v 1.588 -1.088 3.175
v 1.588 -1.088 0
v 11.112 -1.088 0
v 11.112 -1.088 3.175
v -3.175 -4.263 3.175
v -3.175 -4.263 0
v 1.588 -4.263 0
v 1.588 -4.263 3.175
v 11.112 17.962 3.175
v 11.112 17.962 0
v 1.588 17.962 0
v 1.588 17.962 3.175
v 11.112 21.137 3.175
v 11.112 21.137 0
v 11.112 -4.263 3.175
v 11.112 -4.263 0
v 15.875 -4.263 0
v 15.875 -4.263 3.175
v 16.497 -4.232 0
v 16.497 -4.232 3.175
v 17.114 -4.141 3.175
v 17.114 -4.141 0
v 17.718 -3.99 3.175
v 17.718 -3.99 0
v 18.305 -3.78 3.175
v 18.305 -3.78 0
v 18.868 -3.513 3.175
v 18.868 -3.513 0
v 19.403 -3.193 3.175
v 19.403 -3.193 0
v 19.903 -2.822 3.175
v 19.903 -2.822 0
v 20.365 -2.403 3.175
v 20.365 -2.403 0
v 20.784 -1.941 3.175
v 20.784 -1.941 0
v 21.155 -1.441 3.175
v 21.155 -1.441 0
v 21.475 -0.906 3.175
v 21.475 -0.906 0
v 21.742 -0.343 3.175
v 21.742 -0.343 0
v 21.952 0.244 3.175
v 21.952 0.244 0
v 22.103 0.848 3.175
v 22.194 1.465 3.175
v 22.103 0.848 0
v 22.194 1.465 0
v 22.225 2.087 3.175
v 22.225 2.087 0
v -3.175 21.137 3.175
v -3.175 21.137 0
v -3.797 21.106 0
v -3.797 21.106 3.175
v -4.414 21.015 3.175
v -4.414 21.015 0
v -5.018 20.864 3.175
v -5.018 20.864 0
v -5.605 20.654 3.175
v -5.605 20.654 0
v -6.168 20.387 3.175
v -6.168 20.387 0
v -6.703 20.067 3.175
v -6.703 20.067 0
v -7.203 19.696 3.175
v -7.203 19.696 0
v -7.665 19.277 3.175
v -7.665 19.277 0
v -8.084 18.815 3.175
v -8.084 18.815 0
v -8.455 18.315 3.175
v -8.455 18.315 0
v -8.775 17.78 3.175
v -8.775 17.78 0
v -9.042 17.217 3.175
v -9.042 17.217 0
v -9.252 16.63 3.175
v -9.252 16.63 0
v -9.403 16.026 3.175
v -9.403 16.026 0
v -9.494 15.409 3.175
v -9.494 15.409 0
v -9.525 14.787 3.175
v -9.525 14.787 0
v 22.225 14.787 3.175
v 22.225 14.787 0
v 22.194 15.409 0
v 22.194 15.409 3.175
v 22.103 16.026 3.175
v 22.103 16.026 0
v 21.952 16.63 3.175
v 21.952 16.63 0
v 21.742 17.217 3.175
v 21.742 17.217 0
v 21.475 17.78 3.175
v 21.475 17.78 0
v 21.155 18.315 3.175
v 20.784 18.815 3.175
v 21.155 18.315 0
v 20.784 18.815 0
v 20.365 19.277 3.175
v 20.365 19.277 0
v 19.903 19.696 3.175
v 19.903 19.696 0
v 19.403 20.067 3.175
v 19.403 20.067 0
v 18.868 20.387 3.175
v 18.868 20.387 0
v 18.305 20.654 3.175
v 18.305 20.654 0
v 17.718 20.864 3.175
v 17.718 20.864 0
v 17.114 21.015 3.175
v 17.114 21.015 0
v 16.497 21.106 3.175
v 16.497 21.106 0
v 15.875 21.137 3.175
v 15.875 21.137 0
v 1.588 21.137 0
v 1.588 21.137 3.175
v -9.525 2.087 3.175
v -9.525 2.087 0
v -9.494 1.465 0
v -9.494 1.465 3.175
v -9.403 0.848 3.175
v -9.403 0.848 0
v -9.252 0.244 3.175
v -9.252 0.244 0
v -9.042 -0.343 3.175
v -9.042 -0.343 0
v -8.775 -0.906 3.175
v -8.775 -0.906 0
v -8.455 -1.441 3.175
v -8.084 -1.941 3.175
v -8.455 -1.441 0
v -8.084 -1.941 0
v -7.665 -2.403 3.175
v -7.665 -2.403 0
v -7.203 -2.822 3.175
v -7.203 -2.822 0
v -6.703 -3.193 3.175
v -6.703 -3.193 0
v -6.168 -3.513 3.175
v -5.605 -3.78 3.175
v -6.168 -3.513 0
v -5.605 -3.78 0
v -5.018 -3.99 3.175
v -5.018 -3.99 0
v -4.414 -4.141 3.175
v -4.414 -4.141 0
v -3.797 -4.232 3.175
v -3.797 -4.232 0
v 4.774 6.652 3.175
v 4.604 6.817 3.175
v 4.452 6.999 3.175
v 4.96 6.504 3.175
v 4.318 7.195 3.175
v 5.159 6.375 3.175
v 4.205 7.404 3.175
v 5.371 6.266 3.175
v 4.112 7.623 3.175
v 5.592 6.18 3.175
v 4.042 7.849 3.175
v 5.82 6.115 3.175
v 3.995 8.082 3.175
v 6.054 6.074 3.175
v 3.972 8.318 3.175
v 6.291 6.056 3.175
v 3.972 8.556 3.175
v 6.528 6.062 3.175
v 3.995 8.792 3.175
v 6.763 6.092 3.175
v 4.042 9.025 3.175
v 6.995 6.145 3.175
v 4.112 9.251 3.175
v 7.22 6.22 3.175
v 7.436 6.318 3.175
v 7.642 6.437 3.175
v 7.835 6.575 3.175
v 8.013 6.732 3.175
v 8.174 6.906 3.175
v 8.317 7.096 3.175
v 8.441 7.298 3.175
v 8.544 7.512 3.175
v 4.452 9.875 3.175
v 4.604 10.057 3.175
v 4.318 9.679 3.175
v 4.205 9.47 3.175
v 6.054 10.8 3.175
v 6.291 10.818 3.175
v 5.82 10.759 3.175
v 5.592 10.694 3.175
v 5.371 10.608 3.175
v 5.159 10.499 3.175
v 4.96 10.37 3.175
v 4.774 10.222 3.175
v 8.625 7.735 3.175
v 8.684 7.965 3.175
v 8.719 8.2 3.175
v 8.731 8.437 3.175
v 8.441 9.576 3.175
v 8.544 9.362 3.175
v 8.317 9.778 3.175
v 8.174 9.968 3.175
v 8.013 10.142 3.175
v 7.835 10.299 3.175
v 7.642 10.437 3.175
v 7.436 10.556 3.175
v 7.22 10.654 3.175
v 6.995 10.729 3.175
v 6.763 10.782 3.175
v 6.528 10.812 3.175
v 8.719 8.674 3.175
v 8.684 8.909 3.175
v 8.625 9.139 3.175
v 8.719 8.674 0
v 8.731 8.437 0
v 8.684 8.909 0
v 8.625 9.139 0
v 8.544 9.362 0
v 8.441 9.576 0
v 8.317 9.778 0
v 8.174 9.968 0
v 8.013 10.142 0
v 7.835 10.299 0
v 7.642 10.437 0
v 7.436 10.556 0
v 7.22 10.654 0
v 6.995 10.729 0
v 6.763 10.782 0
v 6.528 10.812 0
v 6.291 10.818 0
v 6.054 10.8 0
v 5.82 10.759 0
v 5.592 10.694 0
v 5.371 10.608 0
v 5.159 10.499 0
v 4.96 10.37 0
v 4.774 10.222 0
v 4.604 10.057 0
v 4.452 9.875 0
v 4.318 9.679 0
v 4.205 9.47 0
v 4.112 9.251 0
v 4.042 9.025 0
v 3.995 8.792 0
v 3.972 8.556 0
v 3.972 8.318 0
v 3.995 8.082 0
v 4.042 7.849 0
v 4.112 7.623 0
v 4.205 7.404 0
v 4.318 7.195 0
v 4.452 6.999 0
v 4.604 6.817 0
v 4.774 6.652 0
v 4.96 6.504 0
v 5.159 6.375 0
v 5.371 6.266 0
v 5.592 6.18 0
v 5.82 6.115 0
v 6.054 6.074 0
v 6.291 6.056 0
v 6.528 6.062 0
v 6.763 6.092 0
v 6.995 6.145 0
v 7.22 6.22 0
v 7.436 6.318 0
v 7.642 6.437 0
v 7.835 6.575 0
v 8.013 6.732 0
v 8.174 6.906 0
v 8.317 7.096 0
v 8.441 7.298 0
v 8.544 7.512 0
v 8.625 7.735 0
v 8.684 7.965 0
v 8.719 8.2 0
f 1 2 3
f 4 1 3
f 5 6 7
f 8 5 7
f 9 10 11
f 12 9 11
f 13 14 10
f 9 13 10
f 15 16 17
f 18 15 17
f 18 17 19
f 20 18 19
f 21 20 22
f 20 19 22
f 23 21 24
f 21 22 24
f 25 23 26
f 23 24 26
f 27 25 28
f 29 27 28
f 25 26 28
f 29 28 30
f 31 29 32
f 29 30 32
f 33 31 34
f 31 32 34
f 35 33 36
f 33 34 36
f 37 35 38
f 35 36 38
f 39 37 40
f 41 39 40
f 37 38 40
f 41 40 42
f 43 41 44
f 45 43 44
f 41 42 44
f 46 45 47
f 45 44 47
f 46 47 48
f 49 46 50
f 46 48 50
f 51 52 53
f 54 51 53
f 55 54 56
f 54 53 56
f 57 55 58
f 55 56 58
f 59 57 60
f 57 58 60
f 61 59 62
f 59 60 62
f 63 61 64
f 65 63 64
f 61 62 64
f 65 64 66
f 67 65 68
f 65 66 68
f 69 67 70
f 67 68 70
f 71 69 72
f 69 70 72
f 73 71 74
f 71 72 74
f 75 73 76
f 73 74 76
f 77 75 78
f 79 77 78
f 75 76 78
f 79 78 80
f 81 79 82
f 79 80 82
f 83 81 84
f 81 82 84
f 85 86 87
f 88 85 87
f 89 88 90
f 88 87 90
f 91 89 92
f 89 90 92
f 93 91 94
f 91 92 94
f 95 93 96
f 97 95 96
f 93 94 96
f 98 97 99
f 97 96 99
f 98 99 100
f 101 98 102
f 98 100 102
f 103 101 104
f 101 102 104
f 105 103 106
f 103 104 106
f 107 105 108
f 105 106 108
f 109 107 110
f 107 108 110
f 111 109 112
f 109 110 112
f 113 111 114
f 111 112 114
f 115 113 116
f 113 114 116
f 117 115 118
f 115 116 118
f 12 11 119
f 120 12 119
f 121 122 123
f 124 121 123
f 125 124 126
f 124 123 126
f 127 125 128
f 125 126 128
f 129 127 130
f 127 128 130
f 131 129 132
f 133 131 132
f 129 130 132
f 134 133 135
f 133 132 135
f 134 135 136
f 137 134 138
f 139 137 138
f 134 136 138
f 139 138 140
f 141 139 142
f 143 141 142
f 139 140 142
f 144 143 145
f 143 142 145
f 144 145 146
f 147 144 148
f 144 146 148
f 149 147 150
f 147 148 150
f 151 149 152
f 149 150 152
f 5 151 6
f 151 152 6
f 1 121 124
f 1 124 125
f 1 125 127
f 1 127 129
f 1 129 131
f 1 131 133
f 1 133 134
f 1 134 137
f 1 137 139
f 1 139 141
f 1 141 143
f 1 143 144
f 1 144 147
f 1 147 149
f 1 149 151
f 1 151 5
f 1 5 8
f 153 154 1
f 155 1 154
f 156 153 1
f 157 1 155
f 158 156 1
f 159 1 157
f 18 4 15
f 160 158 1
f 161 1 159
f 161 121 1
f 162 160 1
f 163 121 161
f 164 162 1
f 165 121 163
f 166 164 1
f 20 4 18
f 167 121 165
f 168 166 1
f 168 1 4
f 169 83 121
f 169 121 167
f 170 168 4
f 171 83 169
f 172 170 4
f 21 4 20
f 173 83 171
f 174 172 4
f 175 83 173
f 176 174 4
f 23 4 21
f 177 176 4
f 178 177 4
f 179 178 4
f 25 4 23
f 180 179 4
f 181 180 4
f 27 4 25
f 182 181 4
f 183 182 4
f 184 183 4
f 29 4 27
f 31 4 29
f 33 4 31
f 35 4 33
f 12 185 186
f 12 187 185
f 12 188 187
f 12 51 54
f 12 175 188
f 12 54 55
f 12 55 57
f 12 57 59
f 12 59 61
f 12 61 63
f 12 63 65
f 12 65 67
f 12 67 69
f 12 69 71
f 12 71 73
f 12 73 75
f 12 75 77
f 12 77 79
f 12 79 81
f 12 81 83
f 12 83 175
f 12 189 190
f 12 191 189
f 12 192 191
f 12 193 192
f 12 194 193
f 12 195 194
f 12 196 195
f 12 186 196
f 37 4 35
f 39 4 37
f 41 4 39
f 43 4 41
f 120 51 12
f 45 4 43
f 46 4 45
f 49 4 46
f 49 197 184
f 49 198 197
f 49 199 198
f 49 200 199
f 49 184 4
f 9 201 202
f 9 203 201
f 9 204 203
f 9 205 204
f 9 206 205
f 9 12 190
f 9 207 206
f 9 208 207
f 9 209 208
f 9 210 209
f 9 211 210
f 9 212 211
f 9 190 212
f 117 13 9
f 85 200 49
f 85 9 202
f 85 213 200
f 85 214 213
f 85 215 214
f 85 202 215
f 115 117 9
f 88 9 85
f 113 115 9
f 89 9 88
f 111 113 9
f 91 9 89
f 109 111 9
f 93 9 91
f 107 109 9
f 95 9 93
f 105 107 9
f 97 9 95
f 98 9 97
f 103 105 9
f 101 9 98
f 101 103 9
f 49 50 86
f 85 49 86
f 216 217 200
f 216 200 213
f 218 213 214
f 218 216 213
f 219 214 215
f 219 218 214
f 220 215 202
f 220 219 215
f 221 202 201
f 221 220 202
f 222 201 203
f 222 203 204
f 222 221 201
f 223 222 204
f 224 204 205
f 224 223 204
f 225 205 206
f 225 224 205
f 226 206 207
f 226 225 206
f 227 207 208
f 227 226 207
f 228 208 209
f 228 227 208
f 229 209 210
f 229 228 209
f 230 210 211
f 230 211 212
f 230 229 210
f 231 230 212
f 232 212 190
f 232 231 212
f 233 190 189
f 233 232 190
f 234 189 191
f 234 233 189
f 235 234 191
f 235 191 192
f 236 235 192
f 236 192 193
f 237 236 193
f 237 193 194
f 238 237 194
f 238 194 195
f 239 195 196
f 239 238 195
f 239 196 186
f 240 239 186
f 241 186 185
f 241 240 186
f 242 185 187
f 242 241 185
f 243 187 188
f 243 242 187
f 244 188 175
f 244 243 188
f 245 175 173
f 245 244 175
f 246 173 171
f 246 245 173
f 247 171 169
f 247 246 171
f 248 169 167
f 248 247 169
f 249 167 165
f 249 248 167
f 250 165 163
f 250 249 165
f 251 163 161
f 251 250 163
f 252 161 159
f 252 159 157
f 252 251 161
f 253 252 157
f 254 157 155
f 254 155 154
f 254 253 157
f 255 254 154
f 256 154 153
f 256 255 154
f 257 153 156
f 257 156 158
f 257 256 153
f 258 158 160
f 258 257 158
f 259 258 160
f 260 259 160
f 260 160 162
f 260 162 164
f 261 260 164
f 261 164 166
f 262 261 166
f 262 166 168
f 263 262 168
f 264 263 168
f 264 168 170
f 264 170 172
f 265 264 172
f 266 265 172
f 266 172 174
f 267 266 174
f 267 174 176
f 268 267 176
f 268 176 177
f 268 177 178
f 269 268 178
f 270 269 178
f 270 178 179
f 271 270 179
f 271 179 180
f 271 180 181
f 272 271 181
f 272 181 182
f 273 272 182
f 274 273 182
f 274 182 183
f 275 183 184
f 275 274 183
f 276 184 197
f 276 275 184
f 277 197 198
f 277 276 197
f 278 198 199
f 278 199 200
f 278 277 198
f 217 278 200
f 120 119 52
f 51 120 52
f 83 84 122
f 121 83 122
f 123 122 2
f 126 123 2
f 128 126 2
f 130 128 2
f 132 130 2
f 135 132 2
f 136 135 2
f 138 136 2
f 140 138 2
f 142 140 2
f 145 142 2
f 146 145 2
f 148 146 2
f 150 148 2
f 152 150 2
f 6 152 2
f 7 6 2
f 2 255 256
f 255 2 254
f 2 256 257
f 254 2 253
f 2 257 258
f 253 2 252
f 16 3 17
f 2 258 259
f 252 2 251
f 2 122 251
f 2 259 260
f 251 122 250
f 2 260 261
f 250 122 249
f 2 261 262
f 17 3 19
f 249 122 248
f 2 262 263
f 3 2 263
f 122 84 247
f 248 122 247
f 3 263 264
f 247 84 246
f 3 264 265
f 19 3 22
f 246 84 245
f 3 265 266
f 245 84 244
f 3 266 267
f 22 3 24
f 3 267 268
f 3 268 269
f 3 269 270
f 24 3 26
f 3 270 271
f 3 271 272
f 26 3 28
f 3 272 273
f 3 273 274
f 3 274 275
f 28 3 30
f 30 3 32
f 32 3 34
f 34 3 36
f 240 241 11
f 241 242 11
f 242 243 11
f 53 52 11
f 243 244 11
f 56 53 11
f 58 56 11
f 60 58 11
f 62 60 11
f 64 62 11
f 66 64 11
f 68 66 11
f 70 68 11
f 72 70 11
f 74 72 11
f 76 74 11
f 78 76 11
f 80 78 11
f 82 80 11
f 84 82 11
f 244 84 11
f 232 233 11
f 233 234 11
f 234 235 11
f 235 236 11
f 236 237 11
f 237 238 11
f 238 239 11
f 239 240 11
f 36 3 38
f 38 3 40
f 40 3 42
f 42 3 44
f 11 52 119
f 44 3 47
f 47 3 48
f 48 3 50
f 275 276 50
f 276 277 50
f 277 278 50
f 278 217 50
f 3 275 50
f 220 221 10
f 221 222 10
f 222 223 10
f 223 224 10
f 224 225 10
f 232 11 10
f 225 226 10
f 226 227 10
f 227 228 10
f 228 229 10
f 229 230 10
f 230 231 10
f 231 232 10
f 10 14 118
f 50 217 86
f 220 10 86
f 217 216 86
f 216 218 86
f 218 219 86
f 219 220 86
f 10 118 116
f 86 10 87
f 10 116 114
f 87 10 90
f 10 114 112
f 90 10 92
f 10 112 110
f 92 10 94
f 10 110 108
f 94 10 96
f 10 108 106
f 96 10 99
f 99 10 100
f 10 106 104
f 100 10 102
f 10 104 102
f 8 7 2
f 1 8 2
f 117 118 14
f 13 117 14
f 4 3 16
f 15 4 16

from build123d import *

# Parameters (mm, degrees)
SKETCH1_R           = 2.38125
BOSS_EXTRUDE1_DEPTH = 3.175


with BuildPart() as part:
    # Sketch1 → Boss-Extrude1 (new body)
    with BuildSketch(Plane.XY):
        with BuildLine():
            Line((1.5875, 21.137006158), (-3.175, 21.137006158))
            ThreePointArc((-3.175, 21.137006158), (-7.665128061, 19.277134219), (-9.525, 14.787006158))
            Line((-9.525, 14.787006158), (-9.525, 2.087006158))
            ThreePointArc((-9.525, 2.087006158), (-7.665128061, -2.403121902), (-3.175, -4.262993842))
            Line((-3.175, -4.262993842), (1.5875, -4.262993842))
            Line((1.5875, -4.262993842), (1.5875, -1.087993842))
            Line((1.5875, -1.087993842), (11.1125, -1.087993842))
            Line((11.1125, -1.087993842), (11.1125, -4.262993842))
            Line((11.1125, -4.262993842), (15.875, -4.262993842))
            ThreePointArc((15.875, -4.262993842), (20.365128061, -2.403121902), (22.225, 2.087006158))
            Line((22.225, 2.087006158), (22.225, 14.787006158))
            ThreePointArc((22.225, 14.787006158), (20.365128061, 19.277134219), (15.875, 21.137006158))
            Line((15.875, 21.137006158), (11.1125, 21.137006158))
            Line((11.1125, 21.137006158), (11.1125, 17.962006158))
            Line((11.1125, 17.962006158), (1.5875, 17.962006158))
            Line((1.5875, 17.962006158), (1.5875, 21.137006158))
        make_face()
        with Locations((6.35, 8.437006158)):
            Circle(SKETCH1_R, mode=Mode.SUBTRACT)
    extrude(amount=BOSS_EXTRUDE1_DEPTH)


solid = part.part
